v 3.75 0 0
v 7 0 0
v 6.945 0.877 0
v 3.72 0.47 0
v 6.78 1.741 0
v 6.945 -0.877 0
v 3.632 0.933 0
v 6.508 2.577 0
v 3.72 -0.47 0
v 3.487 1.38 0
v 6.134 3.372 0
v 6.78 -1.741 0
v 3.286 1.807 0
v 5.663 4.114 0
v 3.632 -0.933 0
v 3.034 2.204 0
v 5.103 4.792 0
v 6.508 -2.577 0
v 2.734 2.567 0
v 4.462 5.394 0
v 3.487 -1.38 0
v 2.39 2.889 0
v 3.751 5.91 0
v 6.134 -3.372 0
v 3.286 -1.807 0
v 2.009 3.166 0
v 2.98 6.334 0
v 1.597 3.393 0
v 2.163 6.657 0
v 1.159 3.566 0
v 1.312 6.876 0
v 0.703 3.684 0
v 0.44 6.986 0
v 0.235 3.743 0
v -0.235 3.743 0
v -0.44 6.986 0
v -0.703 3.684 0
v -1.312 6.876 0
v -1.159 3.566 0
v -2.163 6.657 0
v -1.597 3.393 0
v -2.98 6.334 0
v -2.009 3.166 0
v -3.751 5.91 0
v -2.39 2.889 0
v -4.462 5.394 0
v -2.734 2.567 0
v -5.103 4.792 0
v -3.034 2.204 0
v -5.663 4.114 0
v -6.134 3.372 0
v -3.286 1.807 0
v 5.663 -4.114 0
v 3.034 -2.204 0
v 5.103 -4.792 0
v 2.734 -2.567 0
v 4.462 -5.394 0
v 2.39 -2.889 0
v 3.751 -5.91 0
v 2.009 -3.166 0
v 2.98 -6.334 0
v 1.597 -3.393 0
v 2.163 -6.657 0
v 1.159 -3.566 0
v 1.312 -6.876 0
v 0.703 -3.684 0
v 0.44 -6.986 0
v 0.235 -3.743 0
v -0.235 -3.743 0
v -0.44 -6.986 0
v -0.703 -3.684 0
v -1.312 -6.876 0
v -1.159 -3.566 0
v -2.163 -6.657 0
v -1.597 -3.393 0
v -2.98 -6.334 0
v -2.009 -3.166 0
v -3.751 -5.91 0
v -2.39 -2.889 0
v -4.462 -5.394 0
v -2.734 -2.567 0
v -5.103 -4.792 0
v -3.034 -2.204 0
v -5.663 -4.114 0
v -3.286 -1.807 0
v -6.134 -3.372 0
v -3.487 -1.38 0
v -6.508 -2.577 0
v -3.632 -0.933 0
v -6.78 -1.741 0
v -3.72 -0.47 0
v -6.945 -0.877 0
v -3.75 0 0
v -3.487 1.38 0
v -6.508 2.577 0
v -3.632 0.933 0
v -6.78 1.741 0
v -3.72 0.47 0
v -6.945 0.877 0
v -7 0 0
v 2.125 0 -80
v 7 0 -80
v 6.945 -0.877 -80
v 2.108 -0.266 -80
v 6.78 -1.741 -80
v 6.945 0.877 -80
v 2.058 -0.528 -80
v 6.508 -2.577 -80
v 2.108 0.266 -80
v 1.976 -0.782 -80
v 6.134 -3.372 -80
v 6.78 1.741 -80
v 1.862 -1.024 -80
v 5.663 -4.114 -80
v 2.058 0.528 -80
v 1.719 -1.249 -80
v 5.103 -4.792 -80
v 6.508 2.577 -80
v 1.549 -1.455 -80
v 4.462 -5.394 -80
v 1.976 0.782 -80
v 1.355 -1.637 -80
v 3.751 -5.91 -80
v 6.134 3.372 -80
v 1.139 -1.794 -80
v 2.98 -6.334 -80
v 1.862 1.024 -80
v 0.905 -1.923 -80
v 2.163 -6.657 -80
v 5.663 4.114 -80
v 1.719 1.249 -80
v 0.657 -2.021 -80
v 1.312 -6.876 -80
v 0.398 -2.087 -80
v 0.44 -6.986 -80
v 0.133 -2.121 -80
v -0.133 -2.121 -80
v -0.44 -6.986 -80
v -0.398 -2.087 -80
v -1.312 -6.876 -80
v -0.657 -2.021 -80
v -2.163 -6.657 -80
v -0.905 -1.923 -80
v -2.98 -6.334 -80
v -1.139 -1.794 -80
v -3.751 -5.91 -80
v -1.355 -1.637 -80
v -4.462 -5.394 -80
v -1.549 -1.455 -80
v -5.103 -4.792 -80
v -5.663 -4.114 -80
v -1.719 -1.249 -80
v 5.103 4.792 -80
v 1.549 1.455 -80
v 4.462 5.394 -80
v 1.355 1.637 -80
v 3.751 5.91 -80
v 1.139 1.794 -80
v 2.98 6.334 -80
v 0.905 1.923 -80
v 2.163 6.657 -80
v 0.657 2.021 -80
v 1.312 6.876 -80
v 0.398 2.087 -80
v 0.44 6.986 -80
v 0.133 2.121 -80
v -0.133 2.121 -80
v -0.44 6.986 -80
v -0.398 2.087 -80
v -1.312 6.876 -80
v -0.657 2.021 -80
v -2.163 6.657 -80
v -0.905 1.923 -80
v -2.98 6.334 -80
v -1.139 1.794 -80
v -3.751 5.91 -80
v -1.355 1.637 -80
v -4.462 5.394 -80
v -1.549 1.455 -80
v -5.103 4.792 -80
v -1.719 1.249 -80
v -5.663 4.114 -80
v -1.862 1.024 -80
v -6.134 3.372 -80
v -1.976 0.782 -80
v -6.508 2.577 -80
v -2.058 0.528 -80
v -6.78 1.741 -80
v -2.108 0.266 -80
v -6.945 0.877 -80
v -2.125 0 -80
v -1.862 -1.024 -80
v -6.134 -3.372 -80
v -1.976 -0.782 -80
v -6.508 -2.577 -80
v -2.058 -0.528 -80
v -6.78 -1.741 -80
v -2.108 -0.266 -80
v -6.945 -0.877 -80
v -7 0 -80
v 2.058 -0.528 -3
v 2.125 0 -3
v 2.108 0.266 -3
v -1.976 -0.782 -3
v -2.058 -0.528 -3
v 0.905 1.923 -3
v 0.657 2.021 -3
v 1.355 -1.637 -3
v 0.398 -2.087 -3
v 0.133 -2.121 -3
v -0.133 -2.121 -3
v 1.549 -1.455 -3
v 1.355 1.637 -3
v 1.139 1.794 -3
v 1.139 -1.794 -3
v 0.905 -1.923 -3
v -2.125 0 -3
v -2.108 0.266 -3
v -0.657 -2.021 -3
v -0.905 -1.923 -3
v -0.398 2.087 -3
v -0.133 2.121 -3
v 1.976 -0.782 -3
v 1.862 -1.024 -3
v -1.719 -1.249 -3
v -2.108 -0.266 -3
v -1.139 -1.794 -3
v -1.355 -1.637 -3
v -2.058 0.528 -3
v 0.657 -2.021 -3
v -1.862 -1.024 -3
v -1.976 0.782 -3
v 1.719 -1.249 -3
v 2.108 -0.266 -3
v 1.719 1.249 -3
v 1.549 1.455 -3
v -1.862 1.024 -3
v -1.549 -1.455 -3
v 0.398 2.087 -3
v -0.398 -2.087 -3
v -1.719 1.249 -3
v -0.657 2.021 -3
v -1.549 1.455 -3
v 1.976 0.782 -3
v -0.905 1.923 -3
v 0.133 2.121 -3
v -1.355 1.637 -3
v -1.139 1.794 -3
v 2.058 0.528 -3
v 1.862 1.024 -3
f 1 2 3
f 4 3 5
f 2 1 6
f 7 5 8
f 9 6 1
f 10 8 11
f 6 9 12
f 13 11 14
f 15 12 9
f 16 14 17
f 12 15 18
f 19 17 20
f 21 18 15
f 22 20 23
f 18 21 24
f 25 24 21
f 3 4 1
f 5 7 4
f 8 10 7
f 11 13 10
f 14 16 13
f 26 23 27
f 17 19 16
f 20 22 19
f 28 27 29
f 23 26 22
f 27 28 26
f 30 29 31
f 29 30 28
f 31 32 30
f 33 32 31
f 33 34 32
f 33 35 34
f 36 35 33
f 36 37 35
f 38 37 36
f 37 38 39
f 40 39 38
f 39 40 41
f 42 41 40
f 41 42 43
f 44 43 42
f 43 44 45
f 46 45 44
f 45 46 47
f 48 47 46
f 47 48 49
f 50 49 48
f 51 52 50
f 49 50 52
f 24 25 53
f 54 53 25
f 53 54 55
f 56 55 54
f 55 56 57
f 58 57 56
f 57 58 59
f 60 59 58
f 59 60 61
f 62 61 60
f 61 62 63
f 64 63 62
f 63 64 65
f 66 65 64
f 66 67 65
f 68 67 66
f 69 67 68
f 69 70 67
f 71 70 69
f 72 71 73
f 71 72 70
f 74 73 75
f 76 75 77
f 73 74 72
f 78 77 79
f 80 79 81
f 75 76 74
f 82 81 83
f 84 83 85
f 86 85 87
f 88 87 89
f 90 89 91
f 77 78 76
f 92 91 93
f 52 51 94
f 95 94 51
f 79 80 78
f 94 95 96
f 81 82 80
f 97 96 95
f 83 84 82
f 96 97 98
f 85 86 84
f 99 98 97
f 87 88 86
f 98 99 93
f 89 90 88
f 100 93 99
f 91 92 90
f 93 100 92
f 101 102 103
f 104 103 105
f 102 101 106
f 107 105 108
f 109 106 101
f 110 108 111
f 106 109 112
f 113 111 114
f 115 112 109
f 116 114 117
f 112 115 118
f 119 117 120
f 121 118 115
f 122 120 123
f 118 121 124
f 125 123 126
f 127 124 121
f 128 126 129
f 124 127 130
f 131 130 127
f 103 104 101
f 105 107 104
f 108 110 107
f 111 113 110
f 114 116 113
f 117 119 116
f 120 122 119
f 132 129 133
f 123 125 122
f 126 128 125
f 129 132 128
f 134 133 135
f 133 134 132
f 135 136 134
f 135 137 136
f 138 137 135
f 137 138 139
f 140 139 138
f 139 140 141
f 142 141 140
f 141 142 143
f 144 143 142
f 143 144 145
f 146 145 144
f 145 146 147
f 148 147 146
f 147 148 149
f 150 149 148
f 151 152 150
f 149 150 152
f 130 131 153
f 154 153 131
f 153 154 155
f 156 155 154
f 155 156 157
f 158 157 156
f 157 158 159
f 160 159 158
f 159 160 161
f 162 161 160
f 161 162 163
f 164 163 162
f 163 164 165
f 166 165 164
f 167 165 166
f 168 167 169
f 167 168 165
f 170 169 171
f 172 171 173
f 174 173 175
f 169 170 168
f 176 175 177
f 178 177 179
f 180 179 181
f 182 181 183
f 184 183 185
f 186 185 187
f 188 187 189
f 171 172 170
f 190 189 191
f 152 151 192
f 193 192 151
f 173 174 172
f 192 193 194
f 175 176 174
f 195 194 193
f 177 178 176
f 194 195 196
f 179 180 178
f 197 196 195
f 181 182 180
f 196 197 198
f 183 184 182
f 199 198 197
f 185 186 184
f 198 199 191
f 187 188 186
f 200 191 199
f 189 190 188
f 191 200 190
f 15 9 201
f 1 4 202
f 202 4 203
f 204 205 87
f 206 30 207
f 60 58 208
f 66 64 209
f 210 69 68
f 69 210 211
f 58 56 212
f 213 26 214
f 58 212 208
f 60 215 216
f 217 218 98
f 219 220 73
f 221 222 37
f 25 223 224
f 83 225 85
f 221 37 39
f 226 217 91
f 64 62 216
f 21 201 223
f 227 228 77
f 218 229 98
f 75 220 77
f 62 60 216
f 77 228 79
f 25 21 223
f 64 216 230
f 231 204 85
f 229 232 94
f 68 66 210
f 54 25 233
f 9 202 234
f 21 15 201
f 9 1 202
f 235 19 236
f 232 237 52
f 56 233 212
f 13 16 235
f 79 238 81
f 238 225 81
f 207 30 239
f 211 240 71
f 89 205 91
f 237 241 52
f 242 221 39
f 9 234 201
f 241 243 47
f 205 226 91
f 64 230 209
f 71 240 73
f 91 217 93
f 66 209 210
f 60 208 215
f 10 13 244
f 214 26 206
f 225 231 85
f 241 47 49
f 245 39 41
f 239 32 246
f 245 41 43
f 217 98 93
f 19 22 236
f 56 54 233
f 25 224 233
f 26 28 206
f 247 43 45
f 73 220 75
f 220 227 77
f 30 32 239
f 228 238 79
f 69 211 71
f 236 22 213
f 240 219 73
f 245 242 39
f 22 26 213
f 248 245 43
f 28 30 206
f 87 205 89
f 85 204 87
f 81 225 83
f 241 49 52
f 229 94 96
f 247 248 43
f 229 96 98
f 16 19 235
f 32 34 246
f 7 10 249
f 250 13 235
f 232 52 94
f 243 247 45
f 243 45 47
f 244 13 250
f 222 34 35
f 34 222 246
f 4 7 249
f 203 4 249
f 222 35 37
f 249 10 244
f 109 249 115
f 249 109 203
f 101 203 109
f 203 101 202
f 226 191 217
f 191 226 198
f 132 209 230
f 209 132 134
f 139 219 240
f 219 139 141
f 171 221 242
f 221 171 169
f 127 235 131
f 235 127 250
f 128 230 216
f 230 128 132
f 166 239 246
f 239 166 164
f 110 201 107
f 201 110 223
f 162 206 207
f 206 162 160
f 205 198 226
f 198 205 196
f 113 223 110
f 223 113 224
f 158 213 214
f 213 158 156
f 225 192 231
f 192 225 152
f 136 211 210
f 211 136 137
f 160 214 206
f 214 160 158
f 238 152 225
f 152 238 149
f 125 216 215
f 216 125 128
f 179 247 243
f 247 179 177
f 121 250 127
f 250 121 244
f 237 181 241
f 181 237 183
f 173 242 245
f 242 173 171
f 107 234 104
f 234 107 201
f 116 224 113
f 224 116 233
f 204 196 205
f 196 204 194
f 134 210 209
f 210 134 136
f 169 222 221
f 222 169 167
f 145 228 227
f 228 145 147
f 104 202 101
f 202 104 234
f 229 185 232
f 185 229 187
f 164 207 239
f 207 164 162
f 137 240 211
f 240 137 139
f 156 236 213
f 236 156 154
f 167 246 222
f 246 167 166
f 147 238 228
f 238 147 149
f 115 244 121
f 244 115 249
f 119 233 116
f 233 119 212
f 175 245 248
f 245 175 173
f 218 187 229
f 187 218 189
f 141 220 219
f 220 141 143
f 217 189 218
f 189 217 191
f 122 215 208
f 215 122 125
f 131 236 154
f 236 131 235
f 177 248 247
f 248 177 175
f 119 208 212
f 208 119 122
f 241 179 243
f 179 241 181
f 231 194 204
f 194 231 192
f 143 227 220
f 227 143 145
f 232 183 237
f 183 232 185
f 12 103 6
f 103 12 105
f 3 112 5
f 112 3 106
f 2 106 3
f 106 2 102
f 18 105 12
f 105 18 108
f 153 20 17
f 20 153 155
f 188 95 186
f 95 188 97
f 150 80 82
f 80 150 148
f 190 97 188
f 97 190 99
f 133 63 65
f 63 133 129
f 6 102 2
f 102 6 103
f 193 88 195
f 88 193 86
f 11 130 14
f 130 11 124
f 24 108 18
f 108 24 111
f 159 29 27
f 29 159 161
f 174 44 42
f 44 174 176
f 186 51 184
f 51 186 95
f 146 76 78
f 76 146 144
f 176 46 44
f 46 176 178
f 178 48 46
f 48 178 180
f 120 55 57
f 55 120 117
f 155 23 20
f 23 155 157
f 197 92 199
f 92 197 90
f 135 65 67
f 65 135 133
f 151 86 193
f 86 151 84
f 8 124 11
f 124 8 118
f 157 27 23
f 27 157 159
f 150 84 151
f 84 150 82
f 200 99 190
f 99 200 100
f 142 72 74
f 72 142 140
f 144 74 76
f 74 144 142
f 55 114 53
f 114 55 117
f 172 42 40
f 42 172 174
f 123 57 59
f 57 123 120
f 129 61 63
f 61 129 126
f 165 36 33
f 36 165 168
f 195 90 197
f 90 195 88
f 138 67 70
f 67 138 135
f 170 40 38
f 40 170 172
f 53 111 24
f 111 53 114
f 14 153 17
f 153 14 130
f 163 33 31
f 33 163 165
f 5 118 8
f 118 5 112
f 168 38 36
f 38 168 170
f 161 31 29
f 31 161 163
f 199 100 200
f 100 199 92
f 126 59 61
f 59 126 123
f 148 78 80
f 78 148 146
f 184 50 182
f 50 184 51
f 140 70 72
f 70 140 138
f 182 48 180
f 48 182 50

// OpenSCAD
$fn = 50;


difference() {
	union() {
		translate(v = [0, 0, -80.0000000000]) {
			cylinder(h = 80, r = 7.0000000000);
		}
		cylinder(h = 0, r = 13.0000000000);
	}
	union() {
		translate(v = [0, 0, 0]) {
			rotate(a = [0, 0, 0]) {
				difference() {
					union() {
						#translate(v = [0, 0, -80.0000000000]) {
							cylinder(h = 80, r = 2.0000000000);
						}
						#translate(v = [0, 0, -3]) {
							cylinder(h = 3, r1 = 2.1250000000, r2 = 3.7500000000);
						}
						#translate(v = [0, 0, -80.0000000000]) {
							cylinder(h = 80, r = 2.1250000000);
						}
						#translate(v = [0, 0, -80.0000000000]) {
							cylinder(h = 80, r = 2.0000000000);
						}
					}
					union();
				}
			}
		}
	}
}
